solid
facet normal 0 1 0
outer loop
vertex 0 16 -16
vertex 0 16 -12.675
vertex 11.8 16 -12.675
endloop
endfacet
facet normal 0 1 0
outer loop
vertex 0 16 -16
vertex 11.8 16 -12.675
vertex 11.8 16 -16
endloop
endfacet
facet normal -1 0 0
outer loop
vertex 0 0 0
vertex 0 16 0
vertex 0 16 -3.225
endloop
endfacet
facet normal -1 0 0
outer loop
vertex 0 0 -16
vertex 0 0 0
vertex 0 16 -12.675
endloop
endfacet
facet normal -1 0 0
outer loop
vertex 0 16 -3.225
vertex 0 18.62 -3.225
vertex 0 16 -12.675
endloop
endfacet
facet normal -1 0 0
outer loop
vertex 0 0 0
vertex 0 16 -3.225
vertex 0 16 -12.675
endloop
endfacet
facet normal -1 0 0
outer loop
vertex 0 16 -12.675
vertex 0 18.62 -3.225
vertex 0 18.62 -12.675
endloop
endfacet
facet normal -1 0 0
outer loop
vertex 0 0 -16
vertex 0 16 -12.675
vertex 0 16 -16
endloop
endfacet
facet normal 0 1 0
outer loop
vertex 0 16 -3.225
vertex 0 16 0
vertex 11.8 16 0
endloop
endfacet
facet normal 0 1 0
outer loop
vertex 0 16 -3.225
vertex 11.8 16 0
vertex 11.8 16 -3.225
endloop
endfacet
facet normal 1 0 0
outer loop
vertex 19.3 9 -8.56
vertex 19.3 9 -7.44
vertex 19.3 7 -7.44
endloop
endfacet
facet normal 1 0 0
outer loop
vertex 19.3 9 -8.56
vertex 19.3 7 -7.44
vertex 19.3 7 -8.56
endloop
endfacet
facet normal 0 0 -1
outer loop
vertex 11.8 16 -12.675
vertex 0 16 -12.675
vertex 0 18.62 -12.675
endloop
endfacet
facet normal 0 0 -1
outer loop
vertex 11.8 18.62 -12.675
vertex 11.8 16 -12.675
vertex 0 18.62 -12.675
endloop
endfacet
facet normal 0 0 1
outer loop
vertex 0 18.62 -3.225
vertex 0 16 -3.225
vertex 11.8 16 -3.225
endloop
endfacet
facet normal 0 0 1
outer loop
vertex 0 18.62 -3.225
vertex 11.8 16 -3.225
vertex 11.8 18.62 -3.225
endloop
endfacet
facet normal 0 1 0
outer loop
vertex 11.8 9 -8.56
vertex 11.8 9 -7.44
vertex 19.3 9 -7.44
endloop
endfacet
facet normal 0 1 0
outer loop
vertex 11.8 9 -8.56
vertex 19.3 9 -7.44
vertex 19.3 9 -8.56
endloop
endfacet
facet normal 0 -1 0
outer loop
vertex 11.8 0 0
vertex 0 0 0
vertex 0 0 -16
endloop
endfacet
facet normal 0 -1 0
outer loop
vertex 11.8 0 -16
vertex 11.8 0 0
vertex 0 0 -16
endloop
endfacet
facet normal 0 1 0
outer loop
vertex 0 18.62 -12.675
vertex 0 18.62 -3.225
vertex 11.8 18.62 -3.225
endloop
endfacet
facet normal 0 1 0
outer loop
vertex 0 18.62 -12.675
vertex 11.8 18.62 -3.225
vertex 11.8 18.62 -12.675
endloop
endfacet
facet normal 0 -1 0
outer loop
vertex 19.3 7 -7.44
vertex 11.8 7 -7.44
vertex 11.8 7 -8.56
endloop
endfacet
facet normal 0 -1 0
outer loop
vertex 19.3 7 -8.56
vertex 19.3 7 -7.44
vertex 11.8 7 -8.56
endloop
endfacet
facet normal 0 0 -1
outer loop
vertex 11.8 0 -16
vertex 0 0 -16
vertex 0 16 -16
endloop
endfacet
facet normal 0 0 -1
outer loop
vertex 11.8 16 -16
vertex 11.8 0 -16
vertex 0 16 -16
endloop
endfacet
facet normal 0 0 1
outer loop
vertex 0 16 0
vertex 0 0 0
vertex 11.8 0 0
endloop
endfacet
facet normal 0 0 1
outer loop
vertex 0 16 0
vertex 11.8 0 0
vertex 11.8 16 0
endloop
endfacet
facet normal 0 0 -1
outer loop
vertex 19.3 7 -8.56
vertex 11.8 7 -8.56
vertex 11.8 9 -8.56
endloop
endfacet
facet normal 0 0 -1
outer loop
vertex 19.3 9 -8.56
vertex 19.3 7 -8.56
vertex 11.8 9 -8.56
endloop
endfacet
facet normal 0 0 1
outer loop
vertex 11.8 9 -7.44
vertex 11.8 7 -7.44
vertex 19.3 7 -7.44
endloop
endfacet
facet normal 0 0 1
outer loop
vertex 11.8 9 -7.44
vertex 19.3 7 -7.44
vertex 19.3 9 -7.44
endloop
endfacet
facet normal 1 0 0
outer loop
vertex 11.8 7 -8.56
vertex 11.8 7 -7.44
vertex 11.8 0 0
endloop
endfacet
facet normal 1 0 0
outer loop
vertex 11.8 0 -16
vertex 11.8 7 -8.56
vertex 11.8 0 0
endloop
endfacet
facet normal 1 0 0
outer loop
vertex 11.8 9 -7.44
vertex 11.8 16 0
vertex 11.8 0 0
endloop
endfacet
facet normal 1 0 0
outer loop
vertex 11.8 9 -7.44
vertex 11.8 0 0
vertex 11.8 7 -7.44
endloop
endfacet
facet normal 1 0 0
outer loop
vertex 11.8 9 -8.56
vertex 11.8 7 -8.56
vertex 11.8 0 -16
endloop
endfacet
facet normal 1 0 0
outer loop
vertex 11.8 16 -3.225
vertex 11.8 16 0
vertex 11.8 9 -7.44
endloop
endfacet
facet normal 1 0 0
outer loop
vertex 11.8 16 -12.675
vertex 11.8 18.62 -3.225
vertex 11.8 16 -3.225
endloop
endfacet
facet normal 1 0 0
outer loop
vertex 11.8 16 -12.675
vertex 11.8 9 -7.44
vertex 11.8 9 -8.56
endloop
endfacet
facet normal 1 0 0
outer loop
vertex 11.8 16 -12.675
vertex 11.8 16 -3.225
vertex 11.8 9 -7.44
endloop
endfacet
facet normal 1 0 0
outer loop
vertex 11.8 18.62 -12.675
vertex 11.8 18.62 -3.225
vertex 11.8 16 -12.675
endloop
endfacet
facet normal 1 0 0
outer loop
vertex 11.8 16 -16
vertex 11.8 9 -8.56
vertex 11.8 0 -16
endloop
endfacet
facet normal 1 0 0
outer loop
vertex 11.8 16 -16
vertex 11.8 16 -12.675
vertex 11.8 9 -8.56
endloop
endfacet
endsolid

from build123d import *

# Parameters (mm, degrees)
SKETCH1_W           = 16
SKETCH1_H           = 16
SKETCH1_W_2         = 9.45
SKETCH1_H_2         = 2.62
BOSS_EXTRUDE3_DEPTH = 11.8
SKETCH2_W           = 1.12
SKETCH2_H           = 2
BOSS_EXTRUDE4_DEPTH = 7.5


with BuildPart() as part:
    # Sketch1 → Boss-Extrude3 (new body)
    with BuildSketch(Plane(origin=(0, 0, 0), x_dir=(0, 0, -1), z_dir=(1, 0, 0))):
        with Locations((8, 8)):
            Rectangle(SKETCH1_W, SKETCH1_H)
        with Locations((7.95, 17.31)):
            Rectangle(SKETCH1_W_2, SKETCH1_H_2)
    extrude(amount=BOSS_EXTRUDE3_DEPTH)

    # Sketch2 → Boss-Extrude4 (add)
    with BuildSketch(Plane(origin=(11.8, 0, 0), x_dir=(0, 0, -1), z_dir=(1, 0, 0))):
        with Locations((8, 8)):
            Rectangle(SKETCH2_W, SKETCH2_H)
    extrude(amount=BOSS_EXTRUDE4_DEPTH)


solid = part.part
